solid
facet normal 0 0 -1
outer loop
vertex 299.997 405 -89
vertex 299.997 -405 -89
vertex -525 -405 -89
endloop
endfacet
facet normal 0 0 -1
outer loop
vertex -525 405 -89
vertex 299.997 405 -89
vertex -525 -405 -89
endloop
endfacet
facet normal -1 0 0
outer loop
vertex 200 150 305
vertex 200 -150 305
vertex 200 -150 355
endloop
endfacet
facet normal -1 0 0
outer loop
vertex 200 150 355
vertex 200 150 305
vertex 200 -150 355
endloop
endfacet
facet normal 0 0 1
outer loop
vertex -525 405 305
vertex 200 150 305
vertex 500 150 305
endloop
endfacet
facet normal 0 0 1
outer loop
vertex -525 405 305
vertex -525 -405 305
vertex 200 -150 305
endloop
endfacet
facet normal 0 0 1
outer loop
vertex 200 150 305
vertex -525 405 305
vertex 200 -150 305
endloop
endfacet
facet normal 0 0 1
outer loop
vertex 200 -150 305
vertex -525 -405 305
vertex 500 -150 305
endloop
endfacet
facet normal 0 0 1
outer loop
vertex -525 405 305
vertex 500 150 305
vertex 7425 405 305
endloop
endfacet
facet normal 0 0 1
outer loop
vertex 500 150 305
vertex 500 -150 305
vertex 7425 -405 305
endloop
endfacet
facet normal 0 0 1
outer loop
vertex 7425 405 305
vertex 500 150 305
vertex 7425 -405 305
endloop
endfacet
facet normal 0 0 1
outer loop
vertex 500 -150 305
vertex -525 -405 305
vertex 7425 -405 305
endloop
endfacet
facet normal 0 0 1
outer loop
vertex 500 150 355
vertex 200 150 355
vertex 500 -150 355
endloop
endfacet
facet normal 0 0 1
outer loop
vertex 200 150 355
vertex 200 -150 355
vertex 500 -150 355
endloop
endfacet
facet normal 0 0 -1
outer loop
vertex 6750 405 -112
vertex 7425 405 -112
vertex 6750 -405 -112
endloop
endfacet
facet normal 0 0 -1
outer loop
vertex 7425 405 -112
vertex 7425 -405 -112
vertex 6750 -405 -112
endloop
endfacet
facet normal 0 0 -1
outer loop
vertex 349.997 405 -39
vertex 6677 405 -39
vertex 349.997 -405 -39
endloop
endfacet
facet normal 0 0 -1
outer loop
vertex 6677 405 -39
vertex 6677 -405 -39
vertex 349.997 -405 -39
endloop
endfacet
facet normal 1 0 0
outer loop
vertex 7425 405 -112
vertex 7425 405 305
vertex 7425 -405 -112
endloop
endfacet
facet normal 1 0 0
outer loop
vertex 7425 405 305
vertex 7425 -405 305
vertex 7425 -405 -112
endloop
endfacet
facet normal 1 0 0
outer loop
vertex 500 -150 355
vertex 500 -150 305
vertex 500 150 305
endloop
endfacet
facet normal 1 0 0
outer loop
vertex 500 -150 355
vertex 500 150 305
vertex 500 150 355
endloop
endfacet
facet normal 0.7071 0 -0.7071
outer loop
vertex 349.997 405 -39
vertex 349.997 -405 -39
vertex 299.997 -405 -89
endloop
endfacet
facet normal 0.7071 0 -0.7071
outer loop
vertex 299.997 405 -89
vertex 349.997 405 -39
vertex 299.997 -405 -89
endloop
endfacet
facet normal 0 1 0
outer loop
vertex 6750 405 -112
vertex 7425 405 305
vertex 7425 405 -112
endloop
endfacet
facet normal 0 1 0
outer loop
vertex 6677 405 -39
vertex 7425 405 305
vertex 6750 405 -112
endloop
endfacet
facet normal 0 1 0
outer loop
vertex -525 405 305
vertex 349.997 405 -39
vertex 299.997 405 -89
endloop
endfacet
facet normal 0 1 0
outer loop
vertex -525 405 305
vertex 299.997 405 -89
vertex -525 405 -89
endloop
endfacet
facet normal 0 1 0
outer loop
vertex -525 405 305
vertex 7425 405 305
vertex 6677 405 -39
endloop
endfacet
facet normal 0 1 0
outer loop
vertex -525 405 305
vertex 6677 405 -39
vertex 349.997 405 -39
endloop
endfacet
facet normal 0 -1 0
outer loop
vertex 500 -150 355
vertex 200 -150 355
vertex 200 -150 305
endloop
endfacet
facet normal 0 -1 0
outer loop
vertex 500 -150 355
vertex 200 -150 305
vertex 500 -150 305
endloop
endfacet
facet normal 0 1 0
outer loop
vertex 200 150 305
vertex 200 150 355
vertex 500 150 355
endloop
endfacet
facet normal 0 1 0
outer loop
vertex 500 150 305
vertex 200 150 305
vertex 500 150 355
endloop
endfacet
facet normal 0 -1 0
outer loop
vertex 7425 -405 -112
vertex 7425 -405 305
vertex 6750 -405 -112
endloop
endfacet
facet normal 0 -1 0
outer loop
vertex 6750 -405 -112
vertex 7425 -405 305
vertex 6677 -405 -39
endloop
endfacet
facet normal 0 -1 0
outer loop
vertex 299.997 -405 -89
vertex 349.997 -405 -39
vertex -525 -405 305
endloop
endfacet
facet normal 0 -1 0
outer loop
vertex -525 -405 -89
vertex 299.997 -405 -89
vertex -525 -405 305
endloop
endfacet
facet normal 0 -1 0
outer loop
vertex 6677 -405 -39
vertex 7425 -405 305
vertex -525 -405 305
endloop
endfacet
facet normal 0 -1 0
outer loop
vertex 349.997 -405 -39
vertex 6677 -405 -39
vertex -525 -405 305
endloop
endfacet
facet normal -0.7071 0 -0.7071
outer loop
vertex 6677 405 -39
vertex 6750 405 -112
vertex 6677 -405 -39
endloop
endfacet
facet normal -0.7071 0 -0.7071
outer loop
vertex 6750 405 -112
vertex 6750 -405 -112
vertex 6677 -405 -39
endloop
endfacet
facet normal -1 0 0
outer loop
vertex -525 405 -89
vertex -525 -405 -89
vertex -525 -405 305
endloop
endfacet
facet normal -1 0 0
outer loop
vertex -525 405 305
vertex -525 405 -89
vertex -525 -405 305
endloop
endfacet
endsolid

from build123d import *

# Parameters (mm, degrees)
SKETCH048_W      = 300
SKETCH048_H      = 50
EXTRUDE043_DEPTH = 150
EXTRUDE033_DEPTH = 405


with BuildPart() as extrude043:
    # Sketch048 → Extrude043 (new body, symmetric)
    with BuildSketch(Plane.XZ):
        with Locations((350, 330)):
            Rectangle(SKETCH048_W, SKETCH048_H)
    extrude(amount=EXTRUDE043_DEPTH, both=True)


with BuildPart() as fusion024:
    # Sketch036 → Extrude033 (new body, symmetric)
    with BuildSketch(Plane.XZ):
        Polygon((-525, -89), (-525, 305), (7425, 305), (7425, -112), (6750, -112), (6677, -39), (349.996537, -39), (299.996537, -89), align=None)
    extrude(amount=EXTRUDE033_DEPTH, both=True)

    # Fusion024: union Extrude043
    add(extrude043.part)


solid = fusion024.part
